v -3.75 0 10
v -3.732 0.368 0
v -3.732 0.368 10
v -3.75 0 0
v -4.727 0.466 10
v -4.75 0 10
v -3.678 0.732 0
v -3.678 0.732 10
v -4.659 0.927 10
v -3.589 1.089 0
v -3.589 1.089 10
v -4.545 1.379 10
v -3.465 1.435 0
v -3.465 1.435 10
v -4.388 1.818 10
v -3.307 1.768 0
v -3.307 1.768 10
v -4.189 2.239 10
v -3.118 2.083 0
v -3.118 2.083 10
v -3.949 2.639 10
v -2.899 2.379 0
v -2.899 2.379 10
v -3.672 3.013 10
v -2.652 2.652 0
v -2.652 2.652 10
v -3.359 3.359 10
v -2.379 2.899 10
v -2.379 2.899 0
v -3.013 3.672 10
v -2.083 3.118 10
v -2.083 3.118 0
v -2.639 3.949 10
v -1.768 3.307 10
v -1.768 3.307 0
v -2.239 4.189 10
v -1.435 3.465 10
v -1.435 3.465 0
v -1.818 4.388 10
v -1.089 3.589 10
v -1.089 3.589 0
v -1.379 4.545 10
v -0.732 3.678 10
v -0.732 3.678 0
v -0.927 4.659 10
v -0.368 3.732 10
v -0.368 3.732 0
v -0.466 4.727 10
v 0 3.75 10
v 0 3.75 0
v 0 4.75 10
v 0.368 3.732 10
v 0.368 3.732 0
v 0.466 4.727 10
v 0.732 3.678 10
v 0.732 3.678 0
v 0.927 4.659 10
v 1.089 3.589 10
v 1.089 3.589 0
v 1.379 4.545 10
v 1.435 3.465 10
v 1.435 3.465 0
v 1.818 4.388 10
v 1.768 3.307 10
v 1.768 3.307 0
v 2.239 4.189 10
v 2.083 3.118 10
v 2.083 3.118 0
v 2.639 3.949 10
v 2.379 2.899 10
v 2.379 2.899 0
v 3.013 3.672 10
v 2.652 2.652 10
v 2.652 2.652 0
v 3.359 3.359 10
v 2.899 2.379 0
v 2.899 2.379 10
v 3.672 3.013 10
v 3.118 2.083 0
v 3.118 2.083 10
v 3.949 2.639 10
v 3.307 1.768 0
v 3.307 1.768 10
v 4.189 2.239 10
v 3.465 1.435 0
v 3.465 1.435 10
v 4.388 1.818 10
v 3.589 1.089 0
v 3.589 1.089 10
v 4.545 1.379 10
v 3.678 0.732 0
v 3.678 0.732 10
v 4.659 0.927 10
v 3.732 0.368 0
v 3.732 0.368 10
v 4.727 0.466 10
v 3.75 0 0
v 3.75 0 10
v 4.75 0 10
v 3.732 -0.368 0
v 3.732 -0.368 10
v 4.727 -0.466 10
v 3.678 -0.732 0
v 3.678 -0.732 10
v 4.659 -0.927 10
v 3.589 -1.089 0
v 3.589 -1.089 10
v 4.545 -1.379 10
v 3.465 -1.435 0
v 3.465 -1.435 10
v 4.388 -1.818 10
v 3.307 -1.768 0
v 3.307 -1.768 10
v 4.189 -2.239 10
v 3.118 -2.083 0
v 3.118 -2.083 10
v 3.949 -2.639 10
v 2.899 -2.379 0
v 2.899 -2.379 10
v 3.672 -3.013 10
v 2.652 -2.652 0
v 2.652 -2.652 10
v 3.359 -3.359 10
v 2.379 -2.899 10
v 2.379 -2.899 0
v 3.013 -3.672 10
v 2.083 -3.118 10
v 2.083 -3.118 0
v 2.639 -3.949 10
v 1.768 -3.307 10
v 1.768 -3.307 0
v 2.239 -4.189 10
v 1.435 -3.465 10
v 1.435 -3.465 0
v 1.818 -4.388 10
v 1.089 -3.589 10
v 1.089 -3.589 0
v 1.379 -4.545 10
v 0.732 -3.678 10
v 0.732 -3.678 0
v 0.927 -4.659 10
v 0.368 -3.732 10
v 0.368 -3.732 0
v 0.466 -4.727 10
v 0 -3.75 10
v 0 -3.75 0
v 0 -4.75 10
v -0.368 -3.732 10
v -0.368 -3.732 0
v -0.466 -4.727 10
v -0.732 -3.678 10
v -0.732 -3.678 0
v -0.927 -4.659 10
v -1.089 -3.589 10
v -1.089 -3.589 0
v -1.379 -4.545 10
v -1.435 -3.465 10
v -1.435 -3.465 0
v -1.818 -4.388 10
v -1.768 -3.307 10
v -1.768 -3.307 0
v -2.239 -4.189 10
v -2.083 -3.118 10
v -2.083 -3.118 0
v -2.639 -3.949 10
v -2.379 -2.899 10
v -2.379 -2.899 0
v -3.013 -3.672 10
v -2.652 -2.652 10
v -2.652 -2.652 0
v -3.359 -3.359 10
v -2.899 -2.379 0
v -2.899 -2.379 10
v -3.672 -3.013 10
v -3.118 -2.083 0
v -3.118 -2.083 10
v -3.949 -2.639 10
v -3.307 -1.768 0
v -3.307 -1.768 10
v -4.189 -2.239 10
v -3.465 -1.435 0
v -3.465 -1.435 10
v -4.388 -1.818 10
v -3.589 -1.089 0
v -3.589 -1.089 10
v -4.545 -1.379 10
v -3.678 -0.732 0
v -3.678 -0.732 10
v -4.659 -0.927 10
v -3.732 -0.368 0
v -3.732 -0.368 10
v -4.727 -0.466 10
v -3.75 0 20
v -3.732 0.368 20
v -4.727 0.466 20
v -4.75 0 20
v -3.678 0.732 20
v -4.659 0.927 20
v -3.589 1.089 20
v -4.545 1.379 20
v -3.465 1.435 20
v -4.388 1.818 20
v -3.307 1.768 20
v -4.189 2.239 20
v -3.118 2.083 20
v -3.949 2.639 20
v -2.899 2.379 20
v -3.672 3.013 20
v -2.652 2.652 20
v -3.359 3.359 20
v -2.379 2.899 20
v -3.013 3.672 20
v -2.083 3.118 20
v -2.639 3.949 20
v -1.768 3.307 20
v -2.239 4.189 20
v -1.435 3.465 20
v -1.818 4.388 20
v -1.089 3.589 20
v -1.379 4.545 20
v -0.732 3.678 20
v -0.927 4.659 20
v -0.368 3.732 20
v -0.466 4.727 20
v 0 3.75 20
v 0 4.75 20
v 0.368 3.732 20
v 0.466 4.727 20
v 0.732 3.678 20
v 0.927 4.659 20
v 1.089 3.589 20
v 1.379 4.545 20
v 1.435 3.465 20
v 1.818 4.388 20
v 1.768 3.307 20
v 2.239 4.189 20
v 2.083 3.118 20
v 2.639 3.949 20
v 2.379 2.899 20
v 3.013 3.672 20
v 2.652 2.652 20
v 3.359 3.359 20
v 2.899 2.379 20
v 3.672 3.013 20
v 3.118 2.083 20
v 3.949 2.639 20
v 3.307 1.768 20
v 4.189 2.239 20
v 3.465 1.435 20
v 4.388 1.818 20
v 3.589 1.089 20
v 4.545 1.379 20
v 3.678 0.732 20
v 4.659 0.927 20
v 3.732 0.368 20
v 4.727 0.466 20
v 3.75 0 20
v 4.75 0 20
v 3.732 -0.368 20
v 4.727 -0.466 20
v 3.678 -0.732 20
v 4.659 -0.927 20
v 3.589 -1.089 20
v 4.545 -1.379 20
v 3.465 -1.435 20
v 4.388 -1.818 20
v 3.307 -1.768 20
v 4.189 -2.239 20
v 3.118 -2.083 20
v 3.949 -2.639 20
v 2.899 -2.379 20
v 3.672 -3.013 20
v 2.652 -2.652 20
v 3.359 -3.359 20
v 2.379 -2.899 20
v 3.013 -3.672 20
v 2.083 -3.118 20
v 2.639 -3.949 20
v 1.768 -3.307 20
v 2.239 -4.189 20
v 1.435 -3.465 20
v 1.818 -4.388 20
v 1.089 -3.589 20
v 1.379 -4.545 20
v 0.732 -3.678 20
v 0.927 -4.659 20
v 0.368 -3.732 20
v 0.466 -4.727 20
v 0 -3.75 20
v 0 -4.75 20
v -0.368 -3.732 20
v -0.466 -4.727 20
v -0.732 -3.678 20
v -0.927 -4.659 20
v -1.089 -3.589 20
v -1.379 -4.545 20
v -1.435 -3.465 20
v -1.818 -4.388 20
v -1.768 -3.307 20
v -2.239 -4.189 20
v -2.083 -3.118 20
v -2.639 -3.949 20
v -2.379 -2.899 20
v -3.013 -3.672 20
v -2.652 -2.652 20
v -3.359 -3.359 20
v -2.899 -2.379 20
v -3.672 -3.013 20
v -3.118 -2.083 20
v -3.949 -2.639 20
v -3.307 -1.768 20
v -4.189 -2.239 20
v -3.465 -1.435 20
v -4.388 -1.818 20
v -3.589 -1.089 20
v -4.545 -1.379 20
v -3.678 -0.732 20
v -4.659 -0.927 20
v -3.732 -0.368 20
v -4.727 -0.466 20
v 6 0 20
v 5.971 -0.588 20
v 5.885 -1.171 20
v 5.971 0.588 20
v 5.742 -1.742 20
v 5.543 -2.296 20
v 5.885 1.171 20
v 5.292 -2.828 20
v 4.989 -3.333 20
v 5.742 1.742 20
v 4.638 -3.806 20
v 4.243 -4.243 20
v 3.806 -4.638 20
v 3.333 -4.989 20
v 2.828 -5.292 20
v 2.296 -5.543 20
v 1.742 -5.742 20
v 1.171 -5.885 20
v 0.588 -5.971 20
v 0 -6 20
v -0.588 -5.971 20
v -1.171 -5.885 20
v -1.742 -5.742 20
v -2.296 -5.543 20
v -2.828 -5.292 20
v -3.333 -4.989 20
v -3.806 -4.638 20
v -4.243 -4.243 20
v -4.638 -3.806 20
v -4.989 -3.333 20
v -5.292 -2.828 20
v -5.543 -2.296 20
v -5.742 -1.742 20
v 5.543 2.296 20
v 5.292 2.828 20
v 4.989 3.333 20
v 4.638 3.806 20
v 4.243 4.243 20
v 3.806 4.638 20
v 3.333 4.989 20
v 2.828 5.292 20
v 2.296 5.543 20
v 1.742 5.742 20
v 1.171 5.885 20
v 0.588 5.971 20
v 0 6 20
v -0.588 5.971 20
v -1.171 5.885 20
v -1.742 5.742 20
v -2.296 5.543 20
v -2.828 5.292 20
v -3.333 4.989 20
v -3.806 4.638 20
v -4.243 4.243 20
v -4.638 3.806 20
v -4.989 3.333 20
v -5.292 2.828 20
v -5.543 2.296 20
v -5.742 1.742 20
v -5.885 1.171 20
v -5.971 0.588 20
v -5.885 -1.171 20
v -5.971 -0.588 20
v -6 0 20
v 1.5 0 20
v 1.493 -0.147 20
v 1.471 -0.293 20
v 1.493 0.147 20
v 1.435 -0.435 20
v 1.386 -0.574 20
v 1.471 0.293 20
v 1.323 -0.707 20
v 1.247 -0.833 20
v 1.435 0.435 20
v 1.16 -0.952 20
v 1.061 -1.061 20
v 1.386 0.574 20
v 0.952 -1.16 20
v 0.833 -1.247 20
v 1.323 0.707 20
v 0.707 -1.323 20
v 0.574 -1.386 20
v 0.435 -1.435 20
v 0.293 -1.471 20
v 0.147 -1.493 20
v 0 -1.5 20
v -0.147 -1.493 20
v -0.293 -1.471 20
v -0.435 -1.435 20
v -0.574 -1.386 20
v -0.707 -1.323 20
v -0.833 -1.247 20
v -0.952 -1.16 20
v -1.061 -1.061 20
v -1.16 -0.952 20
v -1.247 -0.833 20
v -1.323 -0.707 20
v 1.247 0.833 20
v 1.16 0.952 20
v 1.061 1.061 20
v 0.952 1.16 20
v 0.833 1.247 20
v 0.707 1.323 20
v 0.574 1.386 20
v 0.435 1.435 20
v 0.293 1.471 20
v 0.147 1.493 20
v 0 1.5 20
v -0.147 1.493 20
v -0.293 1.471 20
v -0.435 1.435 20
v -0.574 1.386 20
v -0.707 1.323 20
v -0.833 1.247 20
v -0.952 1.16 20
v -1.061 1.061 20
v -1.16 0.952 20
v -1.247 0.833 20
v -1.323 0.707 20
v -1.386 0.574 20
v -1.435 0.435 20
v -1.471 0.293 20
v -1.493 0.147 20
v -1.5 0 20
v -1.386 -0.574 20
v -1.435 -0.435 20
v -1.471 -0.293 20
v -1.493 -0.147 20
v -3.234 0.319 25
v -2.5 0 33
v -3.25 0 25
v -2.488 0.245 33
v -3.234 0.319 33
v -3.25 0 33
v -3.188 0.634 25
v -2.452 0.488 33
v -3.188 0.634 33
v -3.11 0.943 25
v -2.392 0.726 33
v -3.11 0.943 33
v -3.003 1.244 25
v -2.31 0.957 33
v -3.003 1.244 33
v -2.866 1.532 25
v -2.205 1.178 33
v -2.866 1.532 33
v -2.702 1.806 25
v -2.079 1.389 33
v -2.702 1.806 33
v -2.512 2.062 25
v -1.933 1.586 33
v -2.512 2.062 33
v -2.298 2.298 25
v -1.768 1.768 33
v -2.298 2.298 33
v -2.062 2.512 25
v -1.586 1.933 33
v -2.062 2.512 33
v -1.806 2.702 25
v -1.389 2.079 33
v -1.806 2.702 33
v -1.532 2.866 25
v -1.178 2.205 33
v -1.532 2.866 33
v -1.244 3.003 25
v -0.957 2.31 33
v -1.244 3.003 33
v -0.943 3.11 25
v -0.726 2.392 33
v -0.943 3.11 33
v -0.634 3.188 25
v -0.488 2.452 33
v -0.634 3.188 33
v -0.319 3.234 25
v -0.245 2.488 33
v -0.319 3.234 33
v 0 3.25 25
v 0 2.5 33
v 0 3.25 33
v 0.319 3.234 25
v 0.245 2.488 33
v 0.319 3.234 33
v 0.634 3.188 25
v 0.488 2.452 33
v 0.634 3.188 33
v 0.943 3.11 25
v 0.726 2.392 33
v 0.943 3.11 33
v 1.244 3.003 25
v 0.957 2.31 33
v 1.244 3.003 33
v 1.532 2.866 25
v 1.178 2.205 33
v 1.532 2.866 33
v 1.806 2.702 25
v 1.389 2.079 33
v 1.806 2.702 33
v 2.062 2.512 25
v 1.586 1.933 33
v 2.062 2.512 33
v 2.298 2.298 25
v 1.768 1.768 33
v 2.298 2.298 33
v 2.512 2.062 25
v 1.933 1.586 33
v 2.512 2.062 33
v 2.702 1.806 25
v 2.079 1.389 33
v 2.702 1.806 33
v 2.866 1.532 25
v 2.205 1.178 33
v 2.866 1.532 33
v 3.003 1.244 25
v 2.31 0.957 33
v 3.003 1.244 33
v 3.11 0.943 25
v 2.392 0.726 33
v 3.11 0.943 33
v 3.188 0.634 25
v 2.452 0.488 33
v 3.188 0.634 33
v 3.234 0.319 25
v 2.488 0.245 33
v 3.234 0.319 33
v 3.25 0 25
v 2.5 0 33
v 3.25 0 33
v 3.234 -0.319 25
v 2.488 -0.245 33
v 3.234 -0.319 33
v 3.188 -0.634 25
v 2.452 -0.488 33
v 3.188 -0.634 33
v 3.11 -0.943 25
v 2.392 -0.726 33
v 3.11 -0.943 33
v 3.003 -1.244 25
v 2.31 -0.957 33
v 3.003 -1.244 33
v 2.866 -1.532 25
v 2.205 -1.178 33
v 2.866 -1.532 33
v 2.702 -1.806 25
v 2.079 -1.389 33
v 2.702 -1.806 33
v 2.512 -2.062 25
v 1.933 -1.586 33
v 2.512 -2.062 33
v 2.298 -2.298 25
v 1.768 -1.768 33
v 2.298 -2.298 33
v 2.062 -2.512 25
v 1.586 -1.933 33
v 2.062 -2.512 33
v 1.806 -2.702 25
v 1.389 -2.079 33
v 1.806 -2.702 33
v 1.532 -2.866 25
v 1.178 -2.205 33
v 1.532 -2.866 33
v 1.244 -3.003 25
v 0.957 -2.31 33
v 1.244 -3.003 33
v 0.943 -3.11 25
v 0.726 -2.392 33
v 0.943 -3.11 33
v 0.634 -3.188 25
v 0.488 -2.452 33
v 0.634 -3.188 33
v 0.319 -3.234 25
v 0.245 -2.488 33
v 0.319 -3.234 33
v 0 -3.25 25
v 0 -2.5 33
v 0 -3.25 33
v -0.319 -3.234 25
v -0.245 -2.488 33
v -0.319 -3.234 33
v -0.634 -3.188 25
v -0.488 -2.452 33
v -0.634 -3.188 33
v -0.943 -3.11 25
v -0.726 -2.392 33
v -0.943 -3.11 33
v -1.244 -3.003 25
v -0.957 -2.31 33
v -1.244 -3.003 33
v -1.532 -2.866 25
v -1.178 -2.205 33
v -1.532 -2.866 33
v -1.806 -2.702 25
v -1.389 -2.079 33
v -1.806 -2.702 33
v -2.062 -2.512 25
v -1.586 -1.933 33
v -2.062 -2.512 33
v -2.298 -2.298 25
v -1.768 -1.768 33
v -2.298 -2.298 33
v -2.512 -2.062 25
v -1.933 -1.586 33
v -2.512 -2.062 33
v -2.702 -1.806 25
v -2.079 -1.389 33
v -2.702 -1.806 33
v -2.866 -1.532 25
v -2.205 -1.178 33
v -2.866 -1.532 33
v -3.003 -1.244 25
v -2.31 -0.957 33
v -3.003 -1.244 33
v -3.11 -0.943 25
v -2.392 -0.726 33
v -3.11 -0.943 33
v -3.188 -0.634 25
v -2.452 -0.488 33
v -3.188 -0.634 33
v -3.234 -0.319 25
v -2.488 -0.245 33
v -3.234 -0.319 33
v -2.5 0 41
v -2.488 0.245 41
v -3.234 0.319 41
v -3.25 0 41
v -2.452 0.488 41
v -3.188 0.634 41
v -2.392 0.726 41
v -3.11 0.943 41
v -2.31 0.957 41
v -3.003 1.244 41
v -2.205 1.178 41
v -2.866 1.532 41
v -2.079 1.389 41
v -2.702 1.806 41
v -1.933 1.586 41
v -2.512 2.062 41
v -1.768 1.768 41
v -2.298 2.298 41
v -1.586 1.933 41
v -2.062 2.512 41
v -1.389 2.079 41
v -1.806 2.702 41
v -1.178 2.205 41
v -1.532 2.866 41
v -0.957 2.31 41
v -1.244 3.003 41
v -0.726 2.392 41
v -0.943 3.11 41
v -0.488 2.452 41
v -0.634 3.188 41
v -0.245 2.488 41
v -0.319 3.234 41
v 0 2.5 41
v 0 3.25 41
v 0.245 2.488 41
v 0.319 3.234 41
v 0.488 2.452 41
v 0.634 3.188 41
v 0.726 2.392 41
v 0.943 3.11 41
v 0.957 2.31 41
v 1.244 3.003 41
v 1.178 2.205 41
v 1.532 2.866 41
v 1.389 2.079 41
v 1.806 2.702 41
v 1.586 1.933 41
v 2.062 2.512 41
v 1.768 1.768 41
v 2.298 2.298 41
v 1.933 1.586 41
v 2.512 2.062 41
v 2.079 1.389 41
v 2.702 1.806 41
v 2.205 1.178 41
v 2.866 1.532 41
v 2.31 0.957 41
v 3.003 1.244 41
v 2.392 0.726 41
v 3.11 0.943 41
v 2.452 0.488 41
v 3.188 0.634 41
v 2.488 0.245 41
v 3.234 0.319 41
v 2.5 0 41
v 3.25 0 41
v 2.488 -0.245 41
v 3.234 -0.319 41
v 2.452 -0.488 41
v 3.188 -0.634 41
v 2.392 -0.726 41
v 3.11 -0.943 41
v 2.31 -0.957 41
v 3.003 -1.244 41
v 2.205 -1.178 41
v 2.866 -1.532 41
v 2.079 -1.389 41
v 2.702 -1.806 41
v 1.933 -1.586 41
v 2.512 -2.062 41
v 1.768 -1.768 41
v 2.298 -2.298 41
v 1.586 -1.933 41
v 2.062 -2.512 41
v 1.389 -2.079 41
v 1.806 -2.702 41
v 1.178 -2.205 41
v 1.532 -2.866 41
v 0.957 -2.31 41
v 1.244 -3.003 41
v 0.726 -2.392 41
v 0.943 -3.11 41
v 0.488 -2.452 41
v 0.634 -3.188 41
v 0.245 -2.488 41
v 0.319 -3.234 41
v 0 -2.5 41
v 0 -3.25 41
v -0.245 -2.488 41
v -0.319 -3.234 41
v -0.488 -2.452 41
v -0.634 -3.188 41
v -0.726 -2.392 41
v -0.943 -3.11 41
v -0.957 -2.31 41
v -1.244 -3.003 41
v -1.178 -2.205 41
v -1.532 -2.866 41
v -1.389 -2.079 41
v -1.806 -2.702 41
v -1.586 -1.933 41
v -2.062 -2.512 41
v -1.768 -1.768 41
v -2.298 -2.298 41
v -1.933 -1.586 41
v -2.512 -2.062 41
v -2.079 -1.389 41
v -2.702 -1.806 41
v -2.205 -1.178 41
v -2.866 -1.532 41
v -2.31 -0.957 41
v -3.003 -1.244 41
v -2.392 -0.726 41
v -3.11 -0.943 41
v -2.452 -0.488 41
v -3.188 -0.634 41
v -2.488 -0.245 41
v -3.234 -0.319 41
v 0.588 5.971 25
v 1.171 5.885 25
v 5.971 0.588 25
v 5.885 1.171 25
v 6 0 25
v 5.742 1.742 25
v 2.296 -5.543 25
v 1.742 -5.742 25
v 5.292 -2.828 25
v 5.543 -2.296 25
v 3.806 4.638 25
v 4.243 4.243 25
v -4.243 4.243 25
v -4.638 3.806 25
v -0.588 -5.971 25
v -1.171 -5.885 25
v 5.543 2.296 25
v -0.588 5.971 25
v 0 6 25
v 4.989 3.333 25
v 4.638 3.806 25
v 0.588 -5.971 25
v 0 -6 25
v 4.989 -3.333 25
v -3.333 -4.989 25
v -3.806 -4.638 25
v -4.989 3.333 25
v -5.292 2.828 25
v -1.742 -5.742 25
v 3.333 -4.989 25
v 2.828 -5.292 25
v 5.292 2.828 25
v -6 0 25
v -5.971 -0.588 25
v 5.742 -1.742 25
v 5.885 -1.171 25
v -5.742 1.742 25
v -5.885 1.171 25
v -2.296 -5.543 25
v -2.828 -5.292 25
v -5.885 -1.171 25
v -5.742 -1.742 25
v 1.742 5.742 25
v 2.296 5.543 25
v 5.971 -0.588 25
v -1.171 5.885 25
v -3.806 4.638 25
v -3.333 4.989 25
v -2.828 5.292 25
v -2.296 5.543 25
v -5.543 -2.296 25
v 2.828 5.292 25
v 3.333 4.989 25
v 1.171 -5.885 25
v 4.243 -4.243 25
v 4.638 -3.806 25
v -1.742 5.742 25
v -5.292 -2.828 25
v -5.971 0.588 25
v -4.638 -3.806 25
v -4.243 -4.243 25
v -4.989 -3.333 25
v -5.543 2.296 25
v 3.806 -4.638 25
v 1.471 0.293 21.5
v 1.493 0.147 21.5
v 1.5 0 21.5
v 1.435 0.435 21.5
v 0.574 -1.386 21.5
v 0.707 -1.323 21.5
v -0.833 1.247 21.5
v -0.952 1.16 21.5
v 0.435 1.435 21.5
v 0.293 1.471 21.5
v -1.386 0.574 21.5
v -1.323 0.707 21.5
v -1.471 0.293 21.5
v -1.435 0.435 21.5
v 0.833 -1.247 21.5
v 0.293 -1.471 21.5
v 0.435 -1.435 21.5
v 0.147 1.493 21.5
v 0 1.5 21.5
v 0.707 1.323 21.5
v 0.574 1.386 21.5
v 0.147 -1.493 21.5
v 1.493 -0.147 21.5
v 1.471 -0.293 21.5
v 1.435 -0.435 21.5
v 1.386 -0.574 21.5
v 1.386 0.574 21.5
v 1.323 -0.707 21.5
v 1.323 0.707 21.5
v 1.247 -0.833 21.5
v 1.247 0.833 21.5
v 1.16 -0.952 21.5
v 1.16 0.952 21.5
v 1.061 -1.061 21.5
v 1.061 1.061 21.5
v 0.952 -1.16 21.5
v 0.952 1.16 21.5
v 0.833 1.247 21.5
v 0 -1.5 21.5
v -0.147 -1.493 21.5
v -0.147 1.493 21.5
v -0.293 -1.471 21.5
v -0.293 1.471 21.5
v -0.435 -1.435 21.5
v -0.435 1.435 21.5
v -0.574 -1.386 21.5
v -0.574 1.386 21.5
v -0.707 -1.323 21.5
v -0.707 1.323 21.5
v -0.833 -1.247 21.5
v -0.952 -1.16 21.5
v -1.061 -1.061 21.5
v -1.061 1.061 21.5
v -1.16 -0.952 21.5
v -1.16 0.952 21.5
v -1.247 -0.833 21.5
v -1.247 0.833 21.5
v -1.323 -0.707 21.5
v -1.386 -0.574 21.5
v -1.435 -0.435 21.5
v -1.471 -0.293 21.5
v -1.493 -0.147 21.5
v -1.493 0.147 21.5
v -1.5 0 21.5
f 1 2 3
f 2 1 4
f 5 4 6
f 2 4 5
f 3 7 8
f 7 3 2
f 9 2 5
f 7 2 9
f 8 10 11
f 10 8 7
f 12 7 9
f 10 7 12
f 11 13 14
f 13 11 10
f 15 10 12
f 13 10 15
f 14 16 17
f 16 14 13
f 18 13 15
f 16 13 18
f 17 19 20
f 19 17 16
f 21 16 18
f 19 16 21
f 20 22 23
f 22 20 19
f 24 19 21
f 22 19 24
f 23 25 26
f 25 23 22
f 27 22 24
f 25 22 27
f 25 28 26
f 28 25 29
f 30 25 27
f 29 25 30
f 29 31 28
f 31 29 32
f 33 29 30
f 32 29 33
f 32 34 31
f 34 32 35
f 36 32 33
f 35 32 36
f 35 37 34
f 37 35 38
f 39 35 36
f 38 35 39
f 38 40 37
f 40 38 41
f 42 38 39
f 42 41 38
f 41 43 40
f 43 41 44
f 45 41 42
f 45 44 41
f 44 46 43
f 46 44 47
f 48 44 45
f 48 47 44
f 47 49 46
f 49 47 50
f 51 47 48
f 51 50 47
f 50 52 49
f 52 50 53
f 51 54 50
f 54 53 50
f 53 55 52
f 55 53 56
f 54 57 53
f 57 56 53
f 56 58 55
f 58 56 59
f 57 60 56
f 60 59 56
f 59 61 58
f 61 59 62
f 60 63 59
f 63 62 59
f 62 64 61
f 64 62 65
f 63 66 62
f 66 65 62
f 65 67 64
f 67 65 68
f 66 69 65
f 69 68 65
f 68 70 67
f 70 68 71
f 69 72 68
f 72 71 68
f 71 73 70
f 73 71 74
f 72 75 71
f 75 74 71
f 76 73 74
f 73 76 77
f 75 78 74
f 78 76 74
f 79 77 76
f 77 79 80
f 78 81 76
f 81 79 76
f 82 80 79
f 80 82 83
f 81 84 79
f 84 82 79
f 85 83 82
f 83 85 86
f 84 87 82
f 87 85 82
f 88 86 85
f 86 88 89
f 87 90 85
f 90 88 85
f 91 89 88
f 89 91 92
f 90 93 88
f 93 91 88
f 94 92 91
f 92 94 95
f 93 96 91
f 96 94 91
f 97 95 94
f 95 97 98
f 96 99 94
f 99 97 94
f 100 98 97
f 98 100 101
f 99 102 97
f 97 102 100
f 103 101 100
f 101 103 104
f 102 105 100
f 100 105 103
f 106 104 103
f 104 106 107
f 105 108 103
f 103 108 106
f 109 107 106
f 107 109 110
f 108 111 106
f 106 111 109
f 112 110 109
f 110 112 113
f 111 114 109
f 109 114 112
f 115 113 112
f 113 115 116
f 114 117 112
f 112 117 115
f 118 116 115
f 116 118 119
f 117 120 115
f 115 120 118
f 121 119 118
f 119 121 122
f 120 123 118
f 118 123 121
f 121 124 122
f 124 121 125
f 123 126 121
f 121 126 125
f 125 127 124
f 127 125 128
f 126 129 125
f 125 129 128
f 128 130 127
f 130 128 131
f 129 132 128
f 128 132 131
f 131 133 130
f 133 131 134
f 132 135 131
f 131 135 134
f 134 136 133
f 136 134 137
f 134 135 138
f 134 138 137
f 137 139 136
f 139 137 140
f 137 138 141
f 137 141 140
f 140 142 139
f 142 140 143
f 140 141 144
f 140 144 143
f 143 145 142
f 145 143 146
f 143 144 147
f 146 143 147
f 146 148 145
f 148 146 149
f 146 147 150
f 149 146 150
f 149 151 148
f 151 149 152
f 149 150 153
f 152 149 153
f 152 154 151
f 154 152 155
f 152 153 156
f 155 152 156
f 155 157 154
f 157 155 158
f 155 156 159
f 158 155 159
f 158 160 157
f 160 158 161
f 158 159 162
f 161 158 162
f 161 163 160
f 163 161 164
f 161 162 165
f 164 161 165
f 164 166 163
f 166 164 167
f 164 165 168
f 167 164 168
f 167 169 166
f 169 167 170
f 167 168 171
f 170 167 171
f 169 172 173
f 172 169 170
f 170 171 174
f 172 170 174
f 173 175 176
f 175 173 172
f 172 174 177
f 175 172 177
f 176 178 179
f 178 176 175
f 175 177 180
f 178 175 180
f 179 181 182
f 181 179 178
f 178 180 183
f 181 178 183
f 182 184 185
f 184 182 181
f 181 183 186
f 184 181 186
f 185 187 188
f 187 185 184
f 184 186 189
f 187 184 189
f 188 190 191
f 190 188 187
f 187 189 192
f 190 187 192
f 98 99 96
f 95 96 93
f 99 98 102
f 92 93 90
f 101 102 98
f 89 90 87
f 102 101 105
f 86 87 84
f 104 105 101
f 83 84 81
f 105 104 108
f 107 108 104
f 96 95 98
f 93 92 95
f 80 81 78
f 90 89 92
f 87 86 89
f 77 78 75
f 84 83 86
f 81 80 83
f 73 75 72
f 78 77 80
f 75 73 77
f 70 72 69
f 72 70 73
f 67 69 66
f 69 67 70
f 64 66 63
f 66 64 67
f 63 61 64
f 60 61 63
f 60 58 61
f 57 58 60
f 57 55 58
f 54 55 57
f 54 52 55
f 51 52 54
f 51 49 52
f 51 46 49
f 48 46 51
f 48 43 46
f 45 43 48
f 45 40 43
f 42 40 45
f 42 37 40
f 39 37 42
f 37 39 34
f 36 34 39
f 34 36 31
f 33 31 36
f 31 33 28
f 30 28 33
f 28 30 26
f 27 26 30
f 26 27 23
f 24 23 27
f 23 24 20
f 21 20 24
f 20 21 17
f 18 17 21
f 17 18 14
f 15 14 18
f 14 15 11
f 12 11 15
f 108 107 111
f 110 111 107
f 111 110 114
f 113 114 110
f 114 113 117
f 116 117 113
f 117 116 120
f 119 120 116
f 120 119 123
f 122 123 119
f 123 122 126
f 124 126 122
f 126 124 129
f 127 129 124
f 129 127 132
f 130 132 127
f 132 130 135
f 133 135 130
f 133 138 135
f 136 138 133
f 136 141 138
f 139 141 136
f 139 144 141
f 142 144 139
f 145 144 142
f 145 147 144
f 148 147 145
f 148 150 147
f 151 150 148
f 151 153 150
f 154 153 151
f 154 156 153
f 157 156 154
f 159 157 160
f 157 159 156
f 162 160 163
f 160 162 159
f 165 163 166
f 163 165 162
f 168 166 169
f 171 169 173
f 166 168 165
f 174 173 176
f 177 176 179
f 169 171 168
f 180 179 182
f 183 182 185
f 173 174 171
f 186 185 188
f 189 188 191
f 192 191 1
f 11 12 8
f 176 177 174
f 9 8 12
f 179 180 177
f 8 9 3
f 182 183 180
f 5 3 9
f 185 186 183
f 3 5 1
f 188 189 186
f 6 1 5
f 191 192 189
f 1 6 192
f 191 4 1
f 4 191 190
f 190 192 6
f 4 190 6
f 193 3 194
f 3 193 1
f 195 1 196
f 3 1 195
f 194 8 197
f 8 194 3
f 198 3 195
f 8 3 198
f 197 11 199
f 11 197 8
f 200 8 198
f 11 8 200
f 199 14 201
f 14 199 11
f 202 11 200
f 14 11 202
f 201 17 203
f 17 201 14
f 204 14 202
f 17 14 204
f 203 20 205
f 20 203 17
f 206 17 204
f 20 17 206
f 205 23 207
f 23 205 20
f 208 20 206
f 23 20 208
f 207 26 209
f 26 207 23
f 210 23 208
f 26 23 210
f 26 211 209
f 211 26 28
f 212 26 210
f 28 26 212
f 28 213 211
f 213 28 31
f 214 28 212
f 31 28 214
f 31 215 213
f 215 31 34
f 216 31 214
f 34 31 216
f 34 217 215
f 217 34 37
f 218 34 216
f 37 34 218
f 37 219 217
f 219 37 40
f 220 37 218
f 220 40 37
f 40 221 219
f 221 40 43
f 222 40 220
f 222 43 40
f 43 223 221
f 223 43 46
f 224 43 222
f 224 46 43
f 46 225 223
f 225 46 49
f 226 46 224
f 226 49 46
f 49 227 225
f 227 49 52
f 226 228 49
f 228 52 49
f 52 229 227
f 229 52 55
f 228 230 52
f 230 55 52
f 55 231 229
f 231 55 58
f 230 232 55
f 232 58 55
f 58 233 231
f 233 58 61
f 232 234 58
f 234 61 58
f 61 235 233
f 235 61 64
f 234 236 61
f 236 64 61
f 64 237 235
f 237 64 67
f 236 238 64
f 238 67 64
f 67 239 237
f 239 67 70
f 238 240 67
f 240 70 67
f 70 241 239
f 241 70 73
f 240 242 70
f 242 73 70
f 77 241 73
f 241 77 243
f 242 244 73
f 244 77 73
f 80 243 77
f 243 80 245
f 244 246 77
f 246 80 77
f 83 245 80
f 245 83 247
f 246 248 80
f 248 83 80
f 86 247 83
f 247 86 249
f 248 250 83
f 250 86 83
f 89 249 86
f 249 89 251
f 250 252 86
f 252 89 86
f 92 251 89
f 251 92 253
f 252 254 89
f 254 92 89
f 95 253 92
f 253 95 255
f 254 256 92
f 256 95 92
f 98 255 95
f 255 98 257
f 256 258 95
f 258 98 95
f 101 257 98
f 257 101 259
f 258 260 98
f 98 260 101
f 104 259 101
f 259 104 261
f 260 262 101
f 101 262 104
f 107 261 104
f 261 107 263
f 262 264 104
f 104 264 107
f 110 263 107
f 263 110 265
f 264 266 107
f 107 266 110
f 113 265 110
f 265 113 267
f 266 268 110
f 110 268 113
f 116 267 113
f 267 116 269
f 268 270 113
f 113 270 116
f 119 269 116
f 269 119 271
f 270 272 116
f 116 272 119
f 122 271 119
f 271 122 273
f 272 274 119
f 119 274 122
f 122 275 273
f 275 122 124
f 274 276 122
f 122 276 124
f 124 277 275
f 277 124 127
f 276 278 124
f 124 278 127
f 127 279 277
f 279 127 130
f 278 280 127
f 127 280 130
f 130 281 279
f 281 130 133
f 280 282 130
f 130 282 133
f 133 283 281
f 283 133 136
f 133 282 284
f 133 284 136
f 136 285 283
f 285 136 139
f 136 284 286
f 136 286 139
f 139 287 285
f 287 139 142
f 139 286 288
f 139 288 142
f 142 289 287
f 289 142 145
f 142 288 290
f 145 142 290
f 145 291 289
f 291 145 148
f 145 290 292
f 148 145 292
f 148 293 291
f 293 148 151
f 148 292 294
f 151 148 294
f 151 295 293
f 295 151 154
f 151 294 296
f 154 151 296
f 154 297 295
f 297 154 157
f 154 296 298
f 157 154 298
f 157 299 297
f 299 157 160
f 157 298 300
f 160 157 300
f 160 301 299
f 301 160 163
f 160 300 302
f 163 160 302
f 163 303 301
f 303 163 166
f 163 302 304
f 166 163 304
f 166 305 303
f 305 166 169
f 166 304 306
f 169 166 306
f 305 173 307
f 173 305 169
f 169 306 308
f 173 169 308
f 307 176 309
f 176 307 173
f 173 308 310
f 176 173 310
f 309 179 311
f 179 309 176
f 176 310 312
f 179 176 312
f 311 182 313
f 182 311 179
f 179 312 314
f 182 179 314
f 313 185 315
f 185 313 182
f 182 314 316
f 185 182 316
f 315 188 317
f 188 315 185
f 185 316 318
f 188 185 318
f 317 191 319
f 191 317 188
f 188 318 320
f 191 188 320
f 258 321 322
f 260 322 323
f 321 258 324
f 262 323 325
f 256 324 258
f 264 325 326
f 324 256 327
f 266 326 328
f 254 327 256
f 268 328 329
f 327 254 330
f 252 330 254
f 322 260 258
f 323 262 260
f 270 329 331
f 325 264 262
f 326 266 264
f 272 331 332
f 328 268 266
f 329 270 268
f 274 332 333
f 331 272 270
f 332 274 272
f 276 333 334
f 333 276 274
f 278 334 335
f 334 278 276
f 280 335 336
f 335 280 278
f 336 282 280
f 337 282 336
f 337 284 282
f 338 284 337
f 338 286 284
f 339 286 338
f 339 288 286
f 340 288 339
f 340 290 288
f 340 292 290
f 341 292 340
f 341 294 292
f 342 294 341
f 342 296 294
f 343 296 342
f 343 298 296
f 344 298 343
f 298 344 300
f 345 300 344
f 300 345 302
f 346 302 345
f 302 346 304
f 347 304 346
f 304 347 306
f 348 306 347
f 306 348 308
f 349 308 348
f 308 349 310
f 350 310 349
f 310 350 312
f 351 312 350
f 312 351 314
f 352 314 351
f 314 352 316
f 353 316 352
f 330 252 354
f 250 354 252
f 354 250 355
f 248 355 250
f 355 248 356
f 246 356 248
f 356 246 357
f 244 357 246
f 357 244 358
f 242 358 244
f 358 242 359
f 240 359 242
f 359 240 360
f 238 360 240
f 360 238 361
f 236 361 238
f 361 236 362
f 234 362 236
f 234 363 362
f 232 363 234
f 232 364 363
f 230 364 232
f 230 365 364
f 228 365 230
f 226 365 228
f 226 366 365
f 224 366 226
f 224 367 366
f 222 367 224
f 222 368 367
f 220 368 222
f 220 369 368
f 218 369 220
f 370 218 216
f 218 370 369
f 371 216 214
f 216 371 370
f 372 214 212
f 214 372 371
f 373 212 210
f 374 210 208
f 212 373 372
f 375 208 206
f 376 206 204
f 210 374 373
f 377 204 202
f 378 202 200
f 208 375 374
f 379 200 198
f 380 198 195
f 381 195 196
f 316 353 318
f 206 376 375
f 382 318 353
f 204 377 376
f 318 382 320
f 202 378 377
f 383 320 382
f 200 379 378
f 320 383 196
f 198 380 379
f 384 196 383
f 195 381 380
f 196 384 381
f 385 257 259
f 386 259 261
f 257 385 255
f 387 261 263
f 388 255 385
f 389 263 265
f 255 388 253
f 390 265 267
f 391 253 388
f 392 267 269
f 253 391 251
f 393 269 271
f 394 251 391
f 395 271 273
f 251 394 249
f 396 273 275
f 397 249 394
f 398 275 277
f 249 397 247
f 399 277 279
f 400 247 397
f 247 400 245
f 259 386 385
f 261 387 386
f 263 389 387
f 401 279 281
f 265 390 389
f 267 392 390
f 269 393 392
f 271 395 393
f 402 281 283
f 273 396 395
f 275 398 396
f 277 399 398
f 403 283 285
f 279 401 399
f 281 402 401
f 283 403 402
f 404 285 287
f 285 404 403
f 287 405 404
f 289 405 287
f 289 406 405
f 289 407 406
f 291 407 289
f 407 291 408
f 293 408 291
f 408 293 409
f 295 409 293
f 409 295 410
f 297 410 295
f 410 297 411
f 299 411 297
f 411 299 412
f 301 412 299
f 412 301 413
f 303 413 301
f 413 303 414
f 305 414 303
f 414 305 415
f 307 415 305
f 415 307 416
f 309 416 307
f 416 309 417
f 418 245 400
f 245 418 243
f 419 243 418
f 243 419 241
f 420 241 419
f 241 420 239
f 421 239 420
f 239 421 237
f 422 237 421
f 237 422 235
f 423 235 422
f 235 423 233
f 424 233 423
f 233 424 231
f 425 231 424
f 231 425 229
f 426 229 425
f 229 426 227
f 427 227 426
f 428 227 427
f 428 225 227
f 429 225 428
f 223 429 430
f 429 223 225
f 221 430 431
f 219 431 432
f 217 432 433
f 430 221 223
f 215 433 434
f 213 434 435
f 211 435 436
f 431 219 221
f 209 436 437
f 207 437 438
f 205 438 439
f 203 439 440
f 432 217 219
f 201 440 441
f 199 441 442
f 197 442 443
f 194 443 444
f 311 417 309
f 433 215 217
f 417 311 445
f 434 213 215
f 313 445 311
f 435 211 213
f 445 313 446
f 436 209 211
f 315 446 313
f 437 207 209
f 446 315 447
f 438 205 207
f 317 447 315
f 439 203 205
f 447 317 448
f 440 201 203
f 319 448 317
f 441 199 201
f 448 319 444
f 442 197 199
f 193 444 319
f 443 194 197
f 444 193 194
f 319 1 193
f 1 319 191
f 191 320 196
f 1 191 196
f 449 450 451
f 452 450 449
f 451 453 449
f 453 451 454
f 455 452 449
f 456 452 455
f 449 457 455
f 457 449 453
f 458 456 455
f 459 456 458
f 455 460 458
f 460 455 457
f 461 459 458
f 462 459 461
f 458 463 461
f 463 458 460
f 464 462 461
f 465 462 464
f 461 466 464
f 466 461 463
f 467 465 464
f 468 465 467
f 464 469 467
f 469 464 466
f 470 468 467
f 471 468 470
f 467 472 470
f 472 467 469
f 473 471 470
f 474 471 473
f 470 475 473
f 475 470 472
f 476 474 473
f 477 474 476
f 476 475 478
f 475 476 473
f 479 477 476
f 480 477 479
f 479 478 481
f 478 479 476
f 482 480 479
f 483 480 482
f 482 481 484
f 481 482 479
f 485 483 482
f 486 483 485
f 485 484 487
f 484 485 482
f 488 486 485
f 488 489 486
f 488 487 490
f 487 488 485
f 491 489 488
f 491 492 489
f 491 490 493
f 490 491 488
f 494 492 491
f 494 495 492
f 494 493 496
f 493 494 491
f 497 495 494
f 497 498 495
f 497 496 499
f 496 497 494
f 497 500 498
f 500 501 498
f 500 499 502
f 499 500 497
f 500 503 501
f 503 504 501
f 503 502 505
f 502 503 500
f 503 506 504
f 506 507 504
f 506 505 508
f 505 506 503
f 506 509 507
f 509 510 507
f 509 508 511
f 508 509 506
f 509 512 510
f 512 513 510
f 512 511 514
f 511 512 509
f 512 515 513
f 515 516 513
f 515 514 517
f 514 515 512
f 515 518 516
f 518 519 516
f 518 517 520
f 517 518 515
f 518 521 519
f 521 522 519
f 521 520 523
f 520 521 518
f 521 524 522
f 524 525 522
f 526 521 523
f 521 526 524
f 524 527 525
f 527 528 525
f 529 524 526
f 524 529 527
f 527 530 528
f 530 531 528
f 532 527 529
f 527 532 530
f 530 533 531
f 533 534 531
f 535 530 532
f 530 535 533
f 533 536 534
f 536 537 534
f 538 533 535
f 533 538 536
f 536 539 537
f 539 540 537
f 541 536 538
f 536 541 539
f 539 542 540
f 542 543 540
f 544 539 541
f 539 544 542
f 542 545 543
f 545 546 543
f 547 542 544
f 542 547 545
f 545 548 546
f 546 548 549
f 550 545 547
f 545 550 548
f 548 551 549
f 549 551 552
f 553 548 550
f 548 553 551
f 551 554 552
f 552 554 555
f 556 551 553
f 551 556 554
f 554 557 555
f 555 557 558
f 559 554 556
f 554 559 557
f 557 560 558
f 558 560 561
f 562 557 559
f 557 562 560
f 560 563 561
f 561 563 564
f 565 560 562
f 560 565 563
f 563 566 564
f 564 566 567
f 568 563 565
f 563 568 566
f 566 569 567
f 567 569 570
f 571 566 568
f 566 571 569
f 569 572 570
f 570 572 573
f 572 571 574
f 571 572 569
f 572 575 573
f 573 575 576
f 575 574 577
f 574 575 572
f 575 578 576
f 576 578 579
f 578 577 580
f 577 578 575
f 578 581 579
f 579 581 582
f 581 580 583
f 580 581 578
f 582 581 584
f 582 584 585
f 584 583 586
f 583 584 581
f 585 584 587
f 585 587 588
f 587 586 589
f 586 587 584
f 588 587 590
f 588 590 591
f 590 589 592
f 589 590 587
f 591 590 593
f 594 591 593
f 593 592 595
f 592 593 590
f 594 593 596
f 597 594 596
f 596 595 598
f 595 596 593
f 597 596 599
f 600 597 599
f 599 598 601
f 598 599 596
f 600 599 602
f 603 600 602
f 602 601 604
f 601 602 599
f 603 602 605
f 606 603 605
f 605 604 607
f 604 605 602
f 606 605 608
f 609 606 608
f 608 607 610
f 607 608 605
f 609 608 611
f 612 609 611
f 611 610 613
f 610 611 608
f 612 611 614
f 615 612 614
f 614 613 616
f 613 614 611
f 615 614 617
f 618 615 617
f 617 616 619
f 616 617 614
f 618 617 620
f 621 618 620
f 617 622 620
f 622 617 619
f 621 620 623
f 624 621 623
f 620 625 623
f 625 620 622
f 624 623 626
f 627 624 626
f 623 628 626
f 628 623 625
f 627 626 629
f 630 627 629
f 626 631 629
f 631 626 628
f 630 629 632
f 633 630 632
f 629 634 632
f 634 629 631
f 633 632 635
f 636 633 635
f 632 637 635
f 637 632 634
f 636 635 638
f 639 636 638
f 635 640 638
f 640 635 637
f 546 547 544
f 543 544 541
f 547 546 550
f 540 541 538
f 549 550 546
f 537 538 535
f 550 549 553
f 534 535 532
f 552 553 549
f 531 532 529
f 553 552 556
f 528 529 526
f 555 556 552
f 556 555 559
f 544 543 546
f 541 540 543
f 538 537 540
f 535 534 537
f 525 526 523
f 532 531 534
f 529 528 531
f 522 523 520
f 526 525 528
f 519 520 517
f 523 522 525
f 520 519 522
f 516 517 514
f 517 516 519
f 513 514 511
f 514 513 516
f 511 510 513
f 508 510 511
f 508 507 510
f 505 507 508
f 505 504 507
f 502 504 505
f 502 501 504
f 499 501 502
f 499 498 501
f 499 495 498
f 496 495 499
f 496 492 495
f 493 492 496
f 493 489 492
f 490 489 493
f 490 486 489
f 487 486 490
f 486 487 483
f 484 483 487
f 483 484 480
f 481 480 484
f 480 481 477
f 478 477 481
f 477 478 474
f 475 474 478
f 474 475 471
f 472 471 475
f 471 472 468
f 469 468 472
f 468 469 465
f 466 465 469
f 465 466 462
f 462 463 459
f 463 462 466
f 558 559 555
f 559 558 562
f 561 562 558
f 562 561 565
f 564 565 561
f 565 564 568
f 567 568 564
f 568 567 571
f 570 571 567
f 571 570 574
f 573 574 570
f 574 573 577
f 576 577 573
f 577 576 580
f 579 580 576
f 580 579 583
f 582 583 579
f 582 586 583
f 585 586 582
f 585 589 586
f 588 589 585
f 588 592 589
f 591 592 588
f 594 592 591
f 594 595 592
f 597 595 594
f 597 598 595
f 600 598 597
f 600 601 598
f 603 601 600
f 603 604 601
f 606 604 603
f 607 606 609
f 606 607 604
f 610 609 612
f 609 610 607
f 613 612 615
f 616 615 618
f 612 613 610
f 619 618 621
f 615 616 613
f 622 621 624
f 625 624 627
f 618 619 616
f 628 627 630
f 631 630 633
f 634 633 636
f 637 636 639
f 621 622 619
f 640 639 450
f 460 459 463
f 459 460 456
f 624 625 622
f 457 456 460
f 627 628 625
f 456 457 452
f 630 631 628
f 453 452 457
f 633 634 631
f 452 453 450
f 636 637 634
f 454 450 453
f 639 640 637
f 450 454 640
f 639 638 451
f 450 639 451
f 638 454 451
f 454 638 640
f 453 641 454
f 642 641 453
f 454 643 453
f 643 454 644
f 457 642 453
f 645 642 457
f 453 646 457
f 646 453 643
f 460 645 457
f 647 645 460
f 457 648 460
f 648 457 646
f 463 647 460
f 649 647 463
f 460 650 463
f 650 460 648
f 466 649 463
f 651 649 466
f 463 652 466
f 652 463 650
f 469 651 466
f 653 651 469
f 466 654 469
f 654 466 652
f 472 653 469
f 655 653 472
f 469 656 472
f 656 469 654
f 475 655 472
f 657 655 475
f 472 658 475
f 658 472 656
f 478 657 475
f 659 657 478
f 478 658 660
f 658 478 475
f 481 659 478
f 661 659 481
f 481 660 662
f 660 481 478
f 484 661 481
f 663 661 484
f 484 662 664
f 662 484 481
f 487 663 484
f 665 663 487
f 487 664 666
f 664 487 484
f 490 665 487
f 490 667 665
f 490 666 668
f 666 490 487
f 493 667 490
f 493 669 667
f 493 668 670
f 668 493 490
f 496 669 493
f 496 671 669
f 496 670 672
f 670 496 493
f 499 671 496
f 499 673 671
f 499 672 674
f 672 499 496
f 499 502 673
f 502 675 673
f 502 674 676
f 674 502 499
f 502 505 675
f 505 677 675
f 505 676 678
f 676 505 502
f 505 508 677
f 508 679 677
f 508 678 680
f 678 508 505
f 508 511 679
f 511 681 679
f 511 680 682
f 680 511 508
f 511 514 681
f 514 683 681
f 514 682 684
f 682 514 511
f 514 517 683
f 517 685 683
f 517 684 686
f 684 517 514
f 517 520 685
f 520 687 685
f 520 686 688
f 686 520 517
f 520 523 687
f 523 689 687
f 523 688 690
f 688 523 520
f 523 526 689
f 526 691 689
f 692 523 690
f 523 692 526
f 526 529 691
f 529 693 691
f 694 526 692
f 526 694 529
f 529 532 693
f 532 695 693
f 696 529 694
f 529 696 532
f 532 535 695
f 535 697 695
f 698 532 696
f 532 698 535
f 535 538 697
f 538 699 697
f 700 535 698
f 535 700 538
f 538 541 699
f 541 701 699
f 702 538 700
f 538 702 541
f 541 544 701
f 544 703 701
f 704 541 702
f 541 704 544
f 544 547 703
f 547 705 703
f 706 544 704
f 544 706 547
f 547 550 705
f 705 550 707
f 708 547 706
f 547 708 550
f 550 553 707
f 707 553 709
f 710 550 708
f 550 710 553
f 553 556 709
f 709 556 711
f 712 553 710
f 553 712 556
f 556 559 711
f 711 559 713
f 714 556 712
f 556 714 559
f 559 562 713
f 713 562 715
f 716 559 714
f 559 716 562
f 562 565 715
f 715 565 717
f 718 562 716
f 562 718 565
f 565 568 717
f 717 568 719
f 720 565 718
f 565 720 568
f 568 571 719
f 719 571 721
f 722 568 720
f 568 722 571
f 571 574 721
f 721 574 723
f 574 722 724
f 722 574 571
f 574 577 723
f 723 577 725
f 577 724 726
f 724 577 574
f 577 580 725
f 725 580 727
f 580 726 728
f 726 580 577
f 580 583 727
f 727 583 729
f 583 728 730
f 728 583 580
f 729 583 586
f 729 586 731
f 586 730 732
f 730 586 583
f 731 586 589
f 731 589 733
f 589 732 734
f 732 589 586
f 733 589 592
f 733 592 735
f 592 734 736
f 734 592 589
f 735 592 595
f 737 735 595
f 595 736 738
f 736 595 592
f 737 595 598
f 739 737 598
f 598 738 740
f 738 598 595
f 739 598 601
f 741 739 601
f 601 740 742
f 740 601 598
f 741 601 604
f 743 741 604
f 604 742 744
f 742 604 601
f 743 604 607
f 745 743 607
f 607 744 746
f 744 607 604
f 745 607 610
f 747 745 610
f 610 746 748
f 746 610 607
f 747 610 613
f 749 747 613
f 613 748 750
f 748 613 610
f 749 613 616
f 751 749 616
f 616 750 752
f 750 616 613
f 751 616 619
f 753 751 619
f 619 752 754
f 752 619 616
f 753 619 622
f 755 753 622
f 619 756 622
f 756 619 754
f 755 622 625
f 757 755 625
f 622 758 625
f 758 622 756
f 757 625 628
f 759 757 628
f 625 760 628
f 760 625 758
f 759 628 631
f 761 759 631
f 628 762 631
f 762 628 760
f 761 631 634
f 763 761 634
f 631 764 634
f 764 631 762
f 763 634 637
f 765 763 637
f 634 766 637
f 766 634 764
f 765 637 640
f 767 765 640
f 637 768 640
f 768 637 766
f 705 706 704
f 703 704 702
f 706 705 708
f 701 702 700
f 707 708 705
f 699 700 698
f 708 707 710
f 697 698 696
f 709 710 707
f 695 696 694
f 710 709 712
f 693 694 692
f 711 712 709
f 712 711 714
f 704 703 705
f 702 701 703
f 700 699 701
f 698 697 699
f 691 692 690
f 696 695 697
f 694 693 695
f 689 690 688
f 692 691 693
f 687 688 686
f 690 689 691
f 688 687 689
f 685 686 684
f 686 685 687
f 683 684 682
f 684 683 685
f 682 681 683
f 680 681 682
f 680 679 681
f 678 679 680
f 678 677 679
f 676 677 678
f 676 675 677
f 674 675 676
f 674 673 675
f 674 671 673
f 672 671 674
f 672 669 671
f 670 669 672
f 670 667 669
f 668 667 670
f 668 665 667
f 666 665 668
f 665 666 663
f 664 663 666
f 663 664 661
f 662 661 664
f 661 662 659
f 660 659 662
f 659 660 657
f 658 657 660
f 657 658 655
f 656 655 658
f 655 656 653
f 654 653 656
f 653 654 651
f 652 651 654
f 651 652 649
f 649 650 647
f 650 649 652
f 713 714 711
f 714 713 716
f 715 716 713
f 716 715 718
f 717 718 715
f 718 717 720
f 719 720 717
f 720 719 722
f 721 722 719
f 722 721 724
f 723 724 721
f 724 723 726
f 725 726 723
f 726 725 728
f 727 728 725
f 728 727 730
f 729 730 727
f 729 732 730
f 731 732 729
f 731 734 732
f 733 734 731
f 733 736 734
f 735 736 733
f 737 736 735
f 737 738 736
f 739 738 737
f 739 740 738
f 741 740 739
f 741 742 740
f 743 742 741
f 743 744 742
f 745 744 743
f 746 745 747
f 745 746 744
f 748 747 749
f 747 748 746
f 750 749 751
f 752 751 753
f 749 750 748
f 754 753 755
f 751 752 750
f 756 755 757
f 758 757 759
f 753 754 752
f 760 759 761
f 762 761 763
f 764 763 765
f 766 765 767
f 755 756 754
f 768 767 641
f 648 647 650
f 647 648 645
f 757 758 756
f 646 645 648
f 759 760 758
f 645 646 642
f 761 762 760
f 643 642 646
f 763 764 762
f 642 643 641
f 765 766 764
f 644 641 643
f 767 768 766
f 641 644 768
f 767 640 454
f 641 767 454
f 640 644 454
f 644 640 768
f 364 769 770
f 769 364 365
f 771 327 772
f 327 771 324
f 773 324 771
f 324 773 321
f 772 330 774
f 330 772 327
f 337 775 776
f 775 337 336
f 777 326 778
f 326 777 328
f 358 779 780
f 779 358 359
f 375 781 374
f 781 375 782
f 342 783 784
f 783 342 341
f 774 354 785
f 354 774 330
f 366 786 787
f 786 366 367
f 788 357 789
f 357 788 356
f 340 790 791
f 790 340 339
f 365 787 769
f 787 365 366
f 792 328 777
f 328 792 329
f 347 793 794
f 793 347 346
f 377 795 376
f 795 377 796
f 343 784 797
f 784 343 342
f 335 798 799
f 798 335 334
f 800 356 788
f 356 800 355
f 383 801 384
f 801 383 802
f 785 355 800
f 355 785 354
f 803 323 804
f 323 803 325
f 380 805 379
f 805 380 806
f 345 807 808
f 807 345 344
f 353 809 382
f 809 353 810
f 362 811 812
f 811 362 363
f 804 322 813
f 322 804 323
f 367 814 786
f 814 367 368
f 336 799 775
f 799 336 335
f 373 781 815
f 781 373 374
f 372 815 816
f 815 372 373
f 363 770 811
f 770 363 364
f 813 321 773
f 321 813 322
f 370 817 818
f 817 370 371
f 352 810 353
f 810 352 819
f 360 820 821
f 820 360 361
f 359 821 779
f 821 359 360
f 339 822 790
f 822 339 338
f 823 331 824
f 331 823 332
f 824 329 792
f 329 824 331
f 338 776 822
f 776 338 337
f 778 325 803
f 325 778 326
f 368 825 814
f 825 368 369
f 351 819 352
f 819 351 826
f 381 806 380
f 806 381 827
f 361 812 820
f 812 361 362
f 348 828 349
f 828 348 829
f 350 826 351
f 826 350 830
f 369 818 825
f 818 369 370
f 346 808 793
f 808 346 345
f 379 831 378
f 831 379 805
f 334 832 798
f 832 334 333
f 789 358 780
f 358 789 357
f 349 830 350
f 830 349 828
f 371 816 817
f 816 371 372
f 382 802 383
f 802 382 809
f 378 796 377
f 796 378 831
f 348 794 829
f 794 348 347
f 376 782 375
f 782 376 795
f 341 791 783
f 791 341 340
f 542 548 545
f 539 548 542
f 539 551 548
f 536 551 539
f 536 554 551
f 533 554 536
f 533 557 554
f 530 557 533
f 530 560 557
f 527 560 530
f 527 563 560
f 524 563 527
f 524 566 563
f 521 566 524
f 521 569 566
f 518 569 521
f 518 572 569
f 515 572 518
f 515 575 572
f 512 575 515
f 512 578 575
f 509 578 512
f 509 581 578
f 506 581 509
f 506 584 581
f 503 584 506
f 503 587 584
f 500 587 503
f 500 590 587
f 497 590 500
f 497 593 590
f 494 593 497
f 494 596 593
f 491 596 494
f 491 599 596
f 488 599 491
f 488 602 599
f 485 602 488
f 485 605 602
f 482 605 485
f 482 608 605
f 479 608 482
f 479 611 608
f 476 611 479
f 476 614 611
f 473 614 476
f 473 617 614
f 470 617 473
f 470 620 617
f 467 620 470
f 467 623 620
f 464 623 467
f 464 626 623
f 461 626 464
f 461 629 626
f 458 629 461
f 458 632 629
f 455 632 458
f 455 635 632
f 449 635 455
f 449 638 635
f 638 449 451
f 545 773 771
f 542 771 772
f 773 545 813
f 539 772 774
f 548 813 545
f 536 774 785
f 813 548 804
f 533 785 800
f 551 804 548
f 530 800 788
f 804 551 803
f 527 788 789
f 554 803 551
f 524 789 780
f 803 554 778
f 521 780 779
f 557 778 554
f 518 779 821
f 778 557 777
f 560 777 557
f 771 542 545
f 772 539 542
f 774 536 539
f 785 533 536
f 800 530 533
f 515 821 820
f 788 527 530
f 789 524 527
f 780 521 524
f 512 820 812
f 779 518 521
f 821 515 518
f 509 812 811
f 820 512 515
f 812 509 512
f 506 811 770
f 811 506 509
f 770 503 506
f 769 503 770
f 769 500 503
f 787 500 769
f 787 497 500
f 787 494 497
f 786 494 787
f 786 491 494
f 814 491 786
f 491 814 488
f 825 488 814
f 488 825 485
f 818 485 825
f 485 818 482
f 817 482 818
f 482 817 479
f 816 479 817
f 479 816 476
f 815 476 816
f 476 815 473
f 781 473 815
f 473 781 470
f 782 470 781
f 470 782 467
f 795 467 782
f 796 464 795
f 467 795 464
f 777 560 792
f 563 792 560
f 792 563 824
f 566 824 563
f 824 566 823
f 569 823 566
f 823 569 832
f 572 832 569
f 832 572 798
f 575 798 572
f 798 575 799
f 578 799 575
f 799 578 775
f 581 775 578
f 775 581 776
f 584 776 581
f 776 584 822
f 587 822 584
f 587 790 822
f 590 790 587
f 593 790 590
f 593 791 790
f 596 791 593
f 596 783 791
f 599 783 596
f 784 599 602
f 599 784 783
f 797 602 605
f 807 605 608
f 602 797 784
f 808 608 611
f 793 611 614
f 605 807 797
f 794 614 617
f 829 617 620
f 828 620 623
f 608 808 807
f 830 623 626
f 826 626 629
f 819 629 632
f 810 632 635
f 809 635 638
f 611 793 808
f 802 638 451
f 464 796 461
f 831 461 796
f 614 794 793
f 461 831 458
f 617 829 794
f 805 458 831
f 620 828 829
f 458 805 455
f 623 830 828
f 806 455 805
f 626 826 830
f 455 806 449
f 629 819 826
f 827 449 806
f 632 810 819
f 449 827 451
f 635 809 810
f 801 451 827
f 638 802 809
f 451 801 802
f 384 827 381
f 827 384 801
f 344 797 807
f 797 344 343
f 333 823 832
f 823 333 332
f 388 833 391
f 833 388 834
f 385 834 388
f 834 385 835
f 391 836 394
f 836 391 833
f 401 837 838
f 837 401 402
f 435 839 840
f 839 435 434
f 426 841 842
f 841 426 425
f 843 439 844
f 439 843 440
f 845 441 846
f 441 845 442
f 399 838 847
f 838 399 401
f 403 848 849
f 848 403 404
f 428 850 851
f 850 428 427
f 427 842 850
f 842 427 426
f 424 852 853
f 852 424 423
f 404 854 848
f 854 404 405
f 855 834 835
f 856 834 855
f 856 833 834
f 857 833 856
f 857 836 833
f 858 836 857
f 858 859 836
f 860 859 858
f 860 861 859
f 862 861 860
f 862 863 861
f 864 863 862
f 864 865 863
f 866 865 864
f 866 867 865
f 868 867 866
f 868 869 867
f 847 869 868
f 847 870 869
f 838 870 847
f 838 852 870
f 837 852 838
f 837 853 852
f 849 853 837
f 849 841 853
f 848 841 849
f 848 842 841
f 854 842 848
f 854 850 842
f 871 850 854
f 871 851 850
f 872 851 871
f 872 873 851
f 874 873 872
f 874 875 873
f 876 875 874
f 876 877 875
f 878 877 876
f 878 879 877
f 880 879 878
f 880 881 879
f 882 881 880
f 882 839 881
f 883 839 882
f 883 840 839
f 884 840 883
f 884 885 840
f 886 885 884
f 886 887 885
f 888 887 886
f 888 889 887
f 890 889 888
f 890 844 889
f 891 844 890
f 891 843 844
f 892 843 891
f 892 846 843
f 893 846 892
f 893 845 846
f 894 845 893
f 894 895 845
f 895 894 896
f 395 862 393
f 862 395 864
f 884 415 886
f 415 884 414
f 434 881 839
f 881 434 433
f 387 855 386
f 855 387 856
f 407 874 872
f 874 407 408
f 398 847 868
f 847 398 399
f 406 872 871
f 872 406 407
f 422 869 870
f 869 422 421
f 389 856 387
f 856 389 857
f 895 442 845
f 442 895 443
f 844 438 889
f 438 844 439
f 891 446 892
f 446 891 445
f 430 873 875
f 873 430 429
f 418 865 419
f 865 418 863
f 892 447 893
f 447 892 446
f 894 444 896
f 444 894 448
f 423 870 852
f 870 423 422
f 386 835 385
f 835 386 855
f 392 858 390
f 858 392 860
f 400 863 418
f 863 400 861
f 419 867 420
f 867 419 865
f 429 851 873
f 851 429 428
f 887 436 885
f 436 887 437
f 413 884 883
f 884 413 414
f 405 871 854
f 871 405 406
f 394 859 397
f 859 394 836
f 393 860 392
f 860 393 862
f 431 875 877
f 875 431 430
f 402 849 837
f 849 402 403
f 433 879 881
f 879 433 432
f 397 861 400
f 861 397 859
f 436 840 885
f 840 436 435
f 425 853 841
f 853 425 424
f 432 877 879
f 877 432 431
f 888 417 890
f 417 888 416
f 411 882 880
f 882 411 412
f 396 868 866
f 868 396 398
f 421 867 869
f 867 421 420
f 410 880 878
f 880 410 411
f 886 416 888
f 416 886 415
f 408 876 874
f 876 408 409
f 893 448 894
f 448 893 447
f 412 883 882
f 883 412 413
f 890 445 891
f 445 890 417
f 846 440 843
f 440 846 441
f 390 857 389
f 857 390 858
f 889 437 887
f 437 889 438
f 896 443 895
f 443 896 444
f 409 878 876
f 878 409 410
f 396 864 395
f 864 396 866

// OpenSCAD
// Hose Barb Reducer: 8mm ID to 5mm ID
// Designed for FDM printing, standing upright on Z axis.

// Global settings
$fn = 64; // High resolution for round holes

// --- Dimensions for 8mm Tubing Barbs (Bottom Section) ---
OD_8mm_bottom = 7.5;  // Outer diameter at base of barb
OD_8mm_top = 9.5;     // Outer diameter at peak of barb
Barb8_Height = 10;    // Height of each 8mm barb
Barb8_Count = 2;      // Number of barbs for 8mm side

// --- Dimensions for Collar (Middle Section) ---
Collar_Height = 5;    // Height of the collar (z=20 to z=25)
Collar_OD = 12;       // Outer diameter of the collar

// --- Dimensions for 5mm Tubing Barbs (Top Section) ---
OD_5mm_bottom = 6.5;  // Outer diameter at base of barb
OD_5mm_top = 5.0;     // Outer diameter at peak of barb
Barb5_Height = 8;     // Height of each 5mm barb
Barb5_Count = 2;      // Number of barbs for 5mm side

// --- Bore ---
Bore_Diameter = 3;    // Inner diameter of the through-hole

// --- Helper Module: Sawtooth Barb Profile ---
// Creates a single barb profile in 2D (XY plane)
// x_start: radius at bottom
// x_end: radius at top
// height: height of the barb
// direction: 1 for expanding (8mm side), -1 for contracting (5mm side)
module barb_profile(x_start, x_end, height, direction) {
    // The profile is a trapezoid that steps back.
    // Points: (x_start, 0) -> (x_end, height) -> (x_start, height) -> (x_start, 0)
    // Note: For the 5mm side, x_start > x_end, so it shrinks then steps out.
    polygon(points = [
        [x_start, 0],
        [x_end, height],
        [x_start, height],
        [x_start, 0]
    ]);
}

// --- Main Body Construction ---
difference() {
    union() {
        // 1. Bottom Barbs (8mm tubing)
        // Located from z=0 to z=20
        for (i = [0 : Barb8_Count - 1]) {
            translate([0, 0, i * Barb8_Height]) {
                rotate_extrude() {
                    barb_profile(OD_8mm_bottom / 2, OD_8mm_top / 2, Barb8_Height, 1);
                }
            }
        }

        // 2. Collar
        // Located from z=20 to z=25
        translate([0, 0, Barb8_Count * Barb8_Height]) {
            cylinder(h = Collar_Height, r = Collar_OD / 2, center = false);
        }

        // 3. Top Barbs (5mm tubing)
        // Located from z=25 to z=41
        // Base z for top barbs is 20 (end of bottom barbs) + 5 (collar) = 25
        base_z_top = Barb8_Count * Barb8_Height + Collar_Height;
        for (i = [0 : Barb5_Count - 1]) {
            translate([0, 0, base_z_top + i * Barb5_Height]) {
                rotate_extrude() {
                    barb_profile(OD_5mm_bottom / 2, OD_5mm_top / 2, Barb5_Height, -1);
                }
            }
        }
    }

    // 4. Bore Hole
    // Runs through the entire length. 
    // Total height = 20 (bottom barbs) + 5 (collar) + 16 (top barbs) = 41 mm
    total_height = Barb8_Count * Barb8_Height + Collar_Height + Barb5_Count * Barb5_Height;
    // Extend hole slightly past top and bottom to ensure clean cut
    cylinder(h = total_height + 2, r = Bore_Diameter / 2, center = true);
}
